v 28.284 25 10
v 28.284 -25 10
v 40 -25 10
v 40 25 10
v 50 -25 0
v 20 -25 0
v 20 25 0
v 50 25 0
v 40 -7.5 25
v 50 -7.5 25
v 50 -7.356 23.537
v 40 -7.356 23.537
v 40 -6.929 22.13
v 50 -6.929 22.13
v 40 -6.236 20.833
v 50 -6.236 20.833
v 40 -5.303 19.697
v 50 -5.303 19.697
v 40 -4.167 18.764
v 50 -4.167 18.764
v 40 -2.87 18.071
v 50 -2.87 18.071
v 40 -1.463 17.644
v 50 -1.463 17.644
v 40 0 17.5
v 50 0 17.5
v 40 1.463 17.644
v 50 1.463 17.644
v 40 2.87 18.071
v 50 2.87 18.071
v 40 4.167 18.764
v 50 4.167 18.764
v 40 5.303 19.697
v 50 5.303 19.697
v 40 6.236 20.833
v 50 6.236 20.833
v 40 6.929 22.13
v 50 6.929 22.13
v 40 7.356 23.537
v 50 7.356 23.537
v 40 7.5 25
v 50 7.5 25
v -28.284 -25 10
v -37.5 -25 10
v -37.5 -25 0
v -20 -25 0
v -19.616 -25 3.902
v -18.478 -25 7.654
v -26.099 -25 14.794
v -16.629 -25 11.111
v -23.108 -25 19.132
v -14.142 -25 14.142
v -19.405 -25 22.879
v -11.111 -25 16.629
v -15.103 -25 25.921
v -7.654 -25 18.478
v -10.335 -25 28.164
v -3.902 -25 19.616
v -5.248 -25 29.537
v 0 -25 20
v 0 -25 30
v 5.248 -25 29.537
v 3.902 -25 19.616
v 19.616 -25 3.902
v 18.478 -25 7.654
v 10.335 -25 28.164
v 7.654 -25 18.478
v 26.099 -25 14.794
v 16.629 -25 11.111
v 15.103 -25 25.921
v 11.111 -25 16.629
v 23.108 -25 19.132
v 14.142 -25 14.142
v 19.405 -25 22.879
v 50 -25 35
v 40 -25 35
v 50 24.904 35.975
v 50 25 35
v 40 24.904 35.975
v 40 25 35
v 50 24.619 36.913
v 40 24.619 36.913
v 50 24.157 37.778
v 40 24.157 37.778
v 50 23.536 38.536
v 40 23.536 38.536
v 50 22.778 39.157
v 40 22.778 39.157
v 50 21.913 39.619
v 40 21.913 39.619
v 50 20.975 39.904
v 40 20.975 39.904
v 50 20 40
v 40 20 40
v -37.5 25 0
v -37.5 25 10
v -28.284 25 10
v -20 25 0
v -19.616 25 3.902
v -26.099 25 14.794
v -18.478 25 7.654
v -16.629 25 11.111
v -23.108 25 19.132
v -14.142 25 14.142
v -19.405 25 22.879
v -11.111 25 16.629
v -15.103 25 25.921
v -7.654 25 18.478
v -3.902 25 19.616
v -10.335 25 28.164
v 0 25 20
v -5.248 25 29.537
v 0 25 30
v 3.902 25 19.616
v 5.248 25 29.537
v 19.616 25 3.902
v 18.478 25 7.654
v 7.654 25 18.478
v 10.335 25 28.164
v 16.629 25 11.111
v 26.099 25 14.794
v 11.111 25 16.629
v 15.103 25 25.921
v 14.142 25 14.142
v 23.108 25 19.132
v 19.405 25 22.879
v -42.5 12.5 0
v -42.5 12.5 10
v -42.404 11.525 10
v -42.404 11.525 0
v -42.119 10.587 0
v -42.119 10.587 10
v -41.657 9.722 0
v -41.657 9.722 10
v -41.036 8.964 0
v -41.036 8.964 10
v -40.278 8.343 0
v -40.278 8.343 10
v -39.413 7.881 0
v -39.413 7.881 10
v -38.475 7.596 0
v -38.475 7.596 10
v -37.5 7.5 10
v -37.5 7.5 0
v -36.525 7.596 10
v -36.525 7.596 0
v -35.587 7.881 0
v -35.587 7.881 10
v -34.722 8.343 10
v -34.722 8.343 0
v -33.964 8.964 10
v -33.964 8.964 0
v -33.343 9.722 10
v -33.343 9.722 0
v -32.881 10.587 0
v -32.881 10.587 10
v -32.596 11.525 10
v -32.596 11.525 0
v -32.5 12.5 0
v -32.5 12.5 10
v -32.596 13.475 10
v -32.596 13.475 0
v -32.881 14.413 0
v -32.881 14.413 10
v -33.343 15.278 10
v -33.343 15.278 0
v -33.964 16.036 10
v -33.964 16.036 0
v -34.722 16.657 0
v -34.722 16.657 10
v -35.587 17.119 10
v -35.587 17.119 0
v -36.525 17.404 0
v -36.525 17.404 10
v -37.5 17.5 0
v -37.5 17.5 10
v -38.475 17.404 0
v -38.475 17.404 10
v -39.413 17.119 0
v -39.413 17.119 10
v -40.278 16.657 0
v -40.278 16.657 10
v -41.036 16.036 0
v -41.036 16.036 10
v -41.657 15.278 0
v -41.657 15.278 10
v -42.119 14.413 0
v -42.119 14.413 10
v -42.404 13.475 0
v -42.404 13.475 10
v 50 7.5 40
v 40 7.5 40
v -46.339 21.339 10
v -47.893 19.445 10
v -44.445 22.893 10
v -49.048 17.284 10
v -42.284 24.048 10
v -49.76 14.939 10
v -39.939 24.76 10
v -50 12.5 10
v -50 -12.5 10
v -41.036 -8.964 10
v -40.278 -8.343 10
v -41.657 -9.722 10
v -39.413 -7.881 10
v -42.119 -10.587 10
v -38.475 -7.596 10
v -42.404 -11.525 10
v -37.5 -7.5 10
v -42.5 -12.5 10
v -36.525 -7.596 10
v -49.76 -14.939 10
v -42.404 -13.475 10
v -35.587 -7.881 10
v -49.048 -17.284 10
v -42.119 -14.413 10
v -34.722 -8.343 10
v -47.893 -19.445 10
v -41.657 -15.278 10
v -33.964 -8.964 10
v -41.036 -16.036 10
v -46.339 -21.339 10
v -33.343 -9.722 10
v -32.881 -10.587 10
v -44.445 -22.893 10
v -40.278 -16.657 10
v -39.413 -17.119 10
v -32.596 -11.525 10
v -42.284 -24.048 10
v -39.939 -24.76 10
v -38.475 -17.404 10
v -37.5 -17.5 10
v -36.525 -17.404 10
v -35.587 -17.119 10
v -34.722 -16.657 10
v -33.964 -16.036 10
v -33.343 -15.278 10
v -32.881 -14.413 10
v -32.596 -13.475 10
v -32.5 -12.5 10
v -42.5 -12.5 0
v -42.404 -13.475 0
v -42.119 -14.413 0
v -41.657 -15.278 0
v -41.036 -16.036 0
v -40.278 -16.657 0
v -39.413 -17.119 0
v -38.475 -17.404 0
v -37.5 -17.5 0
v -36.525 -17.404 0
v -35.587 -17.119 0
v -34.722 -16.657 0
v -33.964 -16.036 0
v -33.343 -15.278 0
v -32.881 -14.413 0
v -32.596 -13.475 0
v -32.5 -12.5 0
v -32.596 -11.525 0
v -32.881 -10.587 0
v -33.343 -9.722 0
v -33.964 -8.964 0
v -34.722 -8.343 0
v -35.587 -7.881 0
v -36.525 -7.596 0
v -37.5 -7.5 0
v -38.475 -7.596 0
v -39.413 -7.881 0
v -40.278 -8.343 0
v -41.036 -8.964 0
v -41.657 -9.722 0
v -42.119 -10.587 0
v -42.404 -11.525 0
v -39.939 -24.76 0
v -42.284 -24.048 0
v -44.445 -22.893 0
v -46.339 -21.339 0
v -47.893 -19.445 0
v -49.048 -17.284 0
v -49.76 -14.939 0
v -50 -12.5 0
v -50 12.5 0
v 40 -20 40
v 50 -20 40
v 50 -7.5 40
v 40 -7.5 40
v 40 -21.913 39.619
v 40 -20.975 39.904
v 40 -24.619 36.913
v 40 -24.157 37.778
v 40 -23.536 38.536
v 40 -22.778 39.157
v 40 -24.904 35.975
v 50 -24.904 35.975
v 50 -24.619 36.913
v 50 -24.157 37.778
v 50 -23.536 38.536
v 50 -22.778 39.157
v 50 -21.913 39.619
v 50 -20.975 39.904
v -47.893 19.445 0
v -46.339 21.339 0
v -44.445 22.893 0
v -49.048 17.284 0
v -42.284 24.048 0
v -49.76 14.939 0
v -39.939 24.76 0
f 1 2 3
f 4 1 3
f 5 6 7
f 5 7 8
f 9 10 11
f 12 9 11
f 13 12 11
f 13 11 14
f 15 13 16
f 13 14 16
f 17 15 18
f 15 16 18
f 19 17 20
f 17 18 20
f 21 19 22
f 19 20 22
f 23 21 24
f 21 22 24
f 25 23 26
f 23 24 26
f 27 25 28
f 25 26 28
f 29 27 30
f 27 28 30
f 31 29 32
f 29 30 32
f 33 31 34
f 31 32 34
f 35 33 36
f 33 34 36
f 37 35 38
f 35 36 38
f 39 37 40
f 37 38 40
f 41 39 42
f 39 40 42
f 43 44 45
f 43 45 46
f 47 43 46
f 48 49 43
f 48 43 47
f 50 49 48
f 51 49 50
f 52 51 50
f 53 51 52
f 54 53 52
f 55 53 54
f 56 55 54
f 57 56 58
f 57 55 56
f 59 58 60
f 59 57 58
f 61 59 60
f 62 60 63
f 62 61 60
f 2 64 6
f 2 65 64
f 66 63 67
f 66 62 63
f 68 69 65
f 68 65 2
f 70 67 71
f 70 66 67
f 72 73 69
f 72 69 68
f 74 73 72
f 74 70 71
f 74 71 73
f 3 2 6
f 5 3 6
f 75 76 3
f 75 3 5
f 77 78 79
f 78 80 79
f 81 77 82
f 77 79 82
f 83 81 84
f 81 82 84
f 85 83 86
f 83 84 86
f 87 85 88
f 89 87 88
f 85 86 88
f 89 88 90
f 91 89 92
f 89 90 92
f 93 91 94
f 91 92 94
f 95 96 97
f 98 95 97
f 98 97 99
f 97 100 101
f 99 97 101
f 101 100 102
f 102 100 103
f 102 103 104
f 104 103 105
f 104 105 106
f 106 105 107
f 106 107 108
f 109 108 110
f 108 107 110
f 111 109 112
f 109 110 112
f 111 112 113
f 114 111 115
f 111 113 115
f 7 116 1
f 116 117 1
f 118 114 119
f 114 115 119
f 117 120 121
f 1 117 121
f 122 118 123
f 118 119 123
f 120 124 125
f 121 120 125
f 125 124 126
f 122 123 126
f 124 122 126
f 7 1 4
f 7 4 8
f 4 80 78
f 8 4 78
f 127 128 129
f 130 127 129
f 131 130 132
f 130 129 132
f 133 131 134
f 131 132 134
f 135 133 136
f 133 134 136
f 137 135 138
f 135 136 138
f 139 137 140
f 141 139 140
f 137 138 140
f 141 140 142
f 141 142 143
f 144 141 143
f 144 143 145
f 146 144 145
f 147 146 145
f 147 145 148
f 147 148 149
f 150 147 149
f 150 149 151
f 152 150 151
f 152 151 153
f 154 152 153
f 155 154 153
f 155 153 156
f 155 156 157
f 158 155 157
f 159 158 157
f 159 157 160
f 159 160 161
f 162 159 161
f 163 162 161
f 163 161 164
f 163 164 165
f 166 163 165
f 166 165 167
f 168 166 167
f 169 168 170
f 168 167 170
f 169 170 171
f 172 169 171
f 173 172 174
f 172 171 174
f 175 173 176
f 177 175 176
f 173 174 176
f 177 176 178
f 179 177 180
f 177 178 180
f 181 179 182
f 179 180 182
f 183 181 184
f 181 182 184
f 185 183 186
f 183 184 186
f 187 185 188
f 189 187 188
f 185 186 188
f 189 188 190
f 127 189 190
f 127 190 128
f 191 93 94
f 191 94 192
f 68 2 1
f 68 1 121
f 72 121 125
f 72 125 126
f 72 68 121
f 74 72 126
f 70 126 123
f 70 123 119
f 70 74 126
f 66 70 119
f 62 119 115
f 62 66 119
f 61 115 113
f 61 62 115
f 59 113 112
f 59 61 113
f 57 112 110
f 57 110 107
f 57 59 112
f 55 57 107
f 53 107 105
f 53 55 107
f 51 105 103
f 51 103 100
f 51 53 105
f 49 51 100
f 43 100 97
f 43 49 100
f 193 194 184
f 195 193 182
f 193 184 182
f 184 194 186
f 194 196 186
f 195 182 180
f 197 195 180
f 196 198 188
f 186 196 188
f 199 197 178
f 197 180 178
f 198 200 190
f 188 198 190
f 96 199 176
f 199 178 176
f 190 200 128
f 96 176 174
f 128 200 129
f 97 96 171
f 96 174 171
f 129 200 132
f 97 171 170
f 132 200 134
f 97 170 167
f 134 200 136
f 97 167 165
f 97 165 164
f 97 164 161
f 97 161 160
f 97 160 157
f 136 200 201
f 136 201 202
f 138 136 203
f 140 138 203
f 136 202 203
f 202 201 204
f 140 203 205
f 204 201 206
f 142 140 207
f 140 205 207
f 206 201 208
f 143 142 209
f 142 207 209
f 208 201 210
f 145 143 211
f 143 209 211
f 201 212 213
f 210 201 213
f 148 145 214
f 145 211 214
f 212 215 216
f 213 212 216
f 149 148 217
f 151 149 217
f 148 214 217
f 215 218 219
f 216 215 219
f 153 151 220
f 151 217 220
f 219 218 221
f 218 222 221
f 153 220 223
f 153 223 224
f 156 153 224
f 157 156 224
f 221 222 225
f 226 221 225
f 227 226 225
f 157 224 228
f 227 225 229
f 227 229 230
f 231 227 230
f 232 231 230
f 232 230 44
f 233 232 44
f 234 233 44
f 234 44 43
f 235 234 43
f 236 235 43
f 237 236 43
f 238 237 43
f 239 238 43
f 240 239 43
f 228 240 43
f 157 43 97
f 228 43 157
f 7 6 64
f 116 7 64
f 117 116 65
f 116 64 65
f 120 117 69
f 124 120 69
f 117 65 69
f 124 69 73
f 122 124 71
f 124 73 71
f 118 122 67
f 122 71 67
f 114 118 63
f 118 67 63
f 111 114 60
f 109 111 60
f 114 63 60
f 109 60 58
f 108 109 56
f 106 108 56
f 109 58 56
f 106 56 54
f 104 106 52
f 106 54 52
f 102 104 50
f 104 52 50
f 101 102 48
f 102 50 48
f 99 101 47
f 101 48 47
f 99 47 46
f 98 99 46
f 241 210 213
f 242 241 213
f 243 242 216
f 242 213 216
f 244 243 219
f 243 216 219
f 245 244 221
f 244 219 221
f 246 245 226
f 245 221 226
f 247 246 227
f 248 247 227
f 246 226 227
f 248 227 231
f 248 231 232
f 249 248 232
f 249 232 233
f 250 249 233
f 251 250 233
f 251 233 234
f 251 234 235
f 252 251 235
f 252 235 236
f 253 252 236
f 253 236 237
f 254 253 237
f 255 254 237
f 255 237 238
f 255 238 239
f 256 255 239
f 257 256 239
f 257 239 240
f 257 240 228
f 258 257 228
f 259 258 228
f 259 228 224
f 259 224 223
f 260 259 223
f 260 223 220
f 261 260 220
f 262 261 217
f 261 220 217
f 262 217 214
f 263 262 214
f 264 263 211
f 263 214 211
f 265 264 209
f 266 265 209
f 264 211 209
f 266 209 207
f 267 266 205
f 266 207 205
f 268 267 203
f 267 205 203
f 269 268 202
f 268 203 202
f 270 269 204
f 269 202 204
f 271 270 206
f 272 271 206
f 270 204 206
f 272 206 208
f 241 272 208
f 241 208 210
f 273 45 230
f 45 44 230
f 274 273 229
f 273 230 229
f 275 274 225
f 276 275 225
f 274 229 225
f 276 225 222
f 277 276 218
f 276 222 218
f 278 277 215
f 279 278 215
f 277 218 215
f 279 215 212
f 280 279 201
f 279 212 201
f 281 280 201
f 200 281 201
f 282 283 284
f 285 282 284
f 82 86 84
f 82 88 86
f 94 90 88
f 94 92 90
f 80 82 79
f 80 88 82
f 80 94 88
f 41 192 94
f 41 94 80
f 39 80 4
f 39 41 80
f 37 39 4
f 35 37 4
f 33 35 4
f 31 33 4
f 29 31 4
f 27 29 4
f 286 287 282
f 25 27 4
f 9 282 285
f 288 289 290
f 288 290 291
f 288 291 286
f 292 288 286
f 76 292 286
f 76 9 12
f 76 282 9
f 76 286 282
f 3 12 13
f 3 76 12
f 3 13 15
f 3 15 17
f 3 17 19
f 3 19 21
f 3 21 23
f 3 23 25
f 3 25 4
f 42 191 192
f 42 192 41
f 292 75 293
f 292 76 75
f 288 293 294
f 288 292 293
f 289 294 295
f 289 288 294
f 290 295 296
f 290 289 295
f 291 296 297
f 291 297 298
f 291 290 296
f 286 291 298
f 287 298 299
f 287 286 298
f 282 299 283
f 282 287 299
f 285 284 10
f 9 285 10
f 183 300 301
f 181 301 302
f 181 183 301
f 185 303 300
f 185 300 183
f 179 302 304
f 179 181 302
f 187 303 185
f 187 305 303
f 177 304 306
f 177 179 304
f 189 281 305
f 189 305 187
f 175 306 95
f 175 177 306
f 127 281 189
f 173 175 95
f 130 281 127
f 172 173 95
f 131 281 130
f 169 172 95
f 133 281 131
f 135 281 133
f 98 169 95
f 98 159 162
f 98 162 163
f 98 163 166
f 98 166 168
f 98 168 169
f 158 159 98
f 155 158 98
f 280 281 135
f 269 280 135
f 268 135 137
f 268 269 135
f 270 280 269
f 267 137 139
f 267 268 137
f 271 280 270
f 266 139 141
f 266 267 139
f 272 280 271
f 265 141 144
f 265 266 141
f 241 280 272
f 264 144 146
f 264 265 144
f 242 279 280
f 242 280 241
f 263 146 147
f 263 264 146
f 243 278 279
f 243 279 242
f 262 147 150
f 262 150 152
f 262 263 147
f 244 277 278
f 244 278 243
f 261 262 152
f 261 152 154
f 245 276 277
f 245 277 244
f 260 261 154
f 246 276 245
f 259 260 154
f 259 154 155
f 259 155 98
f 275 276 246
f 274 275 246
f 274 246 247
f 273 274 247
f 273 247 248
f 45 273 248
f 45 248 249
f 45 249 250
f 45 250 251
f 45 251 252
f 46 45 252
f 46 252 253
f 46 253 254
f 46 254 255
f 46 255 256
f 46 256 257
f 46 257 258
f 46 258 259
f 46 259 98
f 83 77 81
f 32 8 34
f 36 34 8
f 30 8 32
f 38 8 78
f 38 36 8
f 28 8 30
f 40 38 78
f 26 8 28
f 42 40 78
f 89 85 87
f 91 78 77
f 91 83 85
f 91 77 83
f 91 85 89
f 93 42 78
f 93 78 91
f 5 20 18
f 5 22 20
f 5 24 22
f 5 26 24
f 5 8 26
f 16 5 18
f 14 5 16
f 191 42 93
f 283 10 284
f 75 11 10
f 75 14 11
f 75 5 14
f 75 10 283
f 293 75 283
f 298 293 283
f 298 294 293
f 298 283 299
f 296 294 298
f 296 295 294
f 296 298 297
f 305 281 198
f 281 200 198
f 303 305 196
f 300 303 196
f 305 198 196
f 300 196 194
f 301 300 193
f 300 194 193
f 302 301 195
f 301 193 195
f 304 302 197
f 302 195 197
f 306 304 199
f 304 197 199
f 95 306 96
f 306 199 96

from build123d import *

# Parameters (mm, degrees)
PAD_DEPTH    = 25
PAD001_DEPTH = 10
FILLET_R     = 12.5
FILLET001_R  = 12.5
FILLET002_R  = 5
FILLET003_R  = 5
SKETCH002_R  = 5
POCKET_DEPTH = 10.001


with BuildPart() as part:
    # Sketch → Pad (new body, symmetric)
    with BuildSketch(Plane.XZ):
        with BuildLine():
            Line((-50, 0), (-20, 0))
            ThreePointArc((20, 0), (0, 20), (-20, 0))
            Line((20, 0), (50, 0))
            Line((50, 0), (50, 10))
            Line((28.284271, 10), (50, 10))
            ThreePointArc((28.284271, 10), (0, 30), (-28.284271, 10))
            Line((-50, 10), (-28.284271, 10))
            Line((-50, 0), (-50, 10))
        make_face()
    extrude(amount=PAD_DEPTH, both=True)

    # Sketch001 → Pad001 (new body)
    with BuildSketch(Plane(origin=(50, 0, 0), x_dir=(0, 0, 1), z_dir=(1, 0, 0))):
        with BuildLine():
            Line((0, 25), (40, 25))
            Line((40, 25), (40, 7.5))
            Line((40, 7.5), (24.999965, 7.5))
            ThreePointArc((24.999965, 7.5), (17.5, -1.8e-05), (25, -7.5))
            Line((40, -7.5), (25, -7.5))
            Line((40, -25), (40, -7.5))
            Line((0, -25), (40, -25))
            Line((0, 25), (0, -25))
        make_face()
    extrude(amount=-PAD001_DEPTH)

    # Fillet
    fillet_edges = [part.edges().sort_by_distance(p)[0] for p in [
        (-50, -25, 5),
    ]]
    fillet(fillet_edges, radius=FILLET_R)

    # Fillet001
    fillet001_edges = [part.edges().sort_by_distance(p)[0] for p in [
        (-50, 25, 5),
    ]]
    fillet(fillet001_edges, radius=FILLET001_R)

    # Fillet002
    fillet002_edges = [part.edges().sort_by_distance(p)[0] for p in [
        (45, -25, 40),
    ]]
    fillet(fillet002_edges, radius=FILLET002_R)

    # Fillet003
    fillet003_edges = [part.edges().sort_by_distance(p)[0] for p in [
        (45, 25, 40),
    ]]
    fillet(fillet003_edges, radius=FILLET003_R)

    # Sketch002 → Pocket (cut, through all)
    with BuildSketch(Plane(origin=(0, 0, 10), x_dir=(-1, 0, 0), z_dir=(0, 0, 1))):
        with Locations((37.5, 12.5)):
            Circle(SKETCH002_R)
        with Locations((37.5, -12.5)):
            Circle(SKETCH002_R)
    extrude(amount=-POCKET_DEPTH, mode=Mode.SUBTRACT)


solid = part.part
